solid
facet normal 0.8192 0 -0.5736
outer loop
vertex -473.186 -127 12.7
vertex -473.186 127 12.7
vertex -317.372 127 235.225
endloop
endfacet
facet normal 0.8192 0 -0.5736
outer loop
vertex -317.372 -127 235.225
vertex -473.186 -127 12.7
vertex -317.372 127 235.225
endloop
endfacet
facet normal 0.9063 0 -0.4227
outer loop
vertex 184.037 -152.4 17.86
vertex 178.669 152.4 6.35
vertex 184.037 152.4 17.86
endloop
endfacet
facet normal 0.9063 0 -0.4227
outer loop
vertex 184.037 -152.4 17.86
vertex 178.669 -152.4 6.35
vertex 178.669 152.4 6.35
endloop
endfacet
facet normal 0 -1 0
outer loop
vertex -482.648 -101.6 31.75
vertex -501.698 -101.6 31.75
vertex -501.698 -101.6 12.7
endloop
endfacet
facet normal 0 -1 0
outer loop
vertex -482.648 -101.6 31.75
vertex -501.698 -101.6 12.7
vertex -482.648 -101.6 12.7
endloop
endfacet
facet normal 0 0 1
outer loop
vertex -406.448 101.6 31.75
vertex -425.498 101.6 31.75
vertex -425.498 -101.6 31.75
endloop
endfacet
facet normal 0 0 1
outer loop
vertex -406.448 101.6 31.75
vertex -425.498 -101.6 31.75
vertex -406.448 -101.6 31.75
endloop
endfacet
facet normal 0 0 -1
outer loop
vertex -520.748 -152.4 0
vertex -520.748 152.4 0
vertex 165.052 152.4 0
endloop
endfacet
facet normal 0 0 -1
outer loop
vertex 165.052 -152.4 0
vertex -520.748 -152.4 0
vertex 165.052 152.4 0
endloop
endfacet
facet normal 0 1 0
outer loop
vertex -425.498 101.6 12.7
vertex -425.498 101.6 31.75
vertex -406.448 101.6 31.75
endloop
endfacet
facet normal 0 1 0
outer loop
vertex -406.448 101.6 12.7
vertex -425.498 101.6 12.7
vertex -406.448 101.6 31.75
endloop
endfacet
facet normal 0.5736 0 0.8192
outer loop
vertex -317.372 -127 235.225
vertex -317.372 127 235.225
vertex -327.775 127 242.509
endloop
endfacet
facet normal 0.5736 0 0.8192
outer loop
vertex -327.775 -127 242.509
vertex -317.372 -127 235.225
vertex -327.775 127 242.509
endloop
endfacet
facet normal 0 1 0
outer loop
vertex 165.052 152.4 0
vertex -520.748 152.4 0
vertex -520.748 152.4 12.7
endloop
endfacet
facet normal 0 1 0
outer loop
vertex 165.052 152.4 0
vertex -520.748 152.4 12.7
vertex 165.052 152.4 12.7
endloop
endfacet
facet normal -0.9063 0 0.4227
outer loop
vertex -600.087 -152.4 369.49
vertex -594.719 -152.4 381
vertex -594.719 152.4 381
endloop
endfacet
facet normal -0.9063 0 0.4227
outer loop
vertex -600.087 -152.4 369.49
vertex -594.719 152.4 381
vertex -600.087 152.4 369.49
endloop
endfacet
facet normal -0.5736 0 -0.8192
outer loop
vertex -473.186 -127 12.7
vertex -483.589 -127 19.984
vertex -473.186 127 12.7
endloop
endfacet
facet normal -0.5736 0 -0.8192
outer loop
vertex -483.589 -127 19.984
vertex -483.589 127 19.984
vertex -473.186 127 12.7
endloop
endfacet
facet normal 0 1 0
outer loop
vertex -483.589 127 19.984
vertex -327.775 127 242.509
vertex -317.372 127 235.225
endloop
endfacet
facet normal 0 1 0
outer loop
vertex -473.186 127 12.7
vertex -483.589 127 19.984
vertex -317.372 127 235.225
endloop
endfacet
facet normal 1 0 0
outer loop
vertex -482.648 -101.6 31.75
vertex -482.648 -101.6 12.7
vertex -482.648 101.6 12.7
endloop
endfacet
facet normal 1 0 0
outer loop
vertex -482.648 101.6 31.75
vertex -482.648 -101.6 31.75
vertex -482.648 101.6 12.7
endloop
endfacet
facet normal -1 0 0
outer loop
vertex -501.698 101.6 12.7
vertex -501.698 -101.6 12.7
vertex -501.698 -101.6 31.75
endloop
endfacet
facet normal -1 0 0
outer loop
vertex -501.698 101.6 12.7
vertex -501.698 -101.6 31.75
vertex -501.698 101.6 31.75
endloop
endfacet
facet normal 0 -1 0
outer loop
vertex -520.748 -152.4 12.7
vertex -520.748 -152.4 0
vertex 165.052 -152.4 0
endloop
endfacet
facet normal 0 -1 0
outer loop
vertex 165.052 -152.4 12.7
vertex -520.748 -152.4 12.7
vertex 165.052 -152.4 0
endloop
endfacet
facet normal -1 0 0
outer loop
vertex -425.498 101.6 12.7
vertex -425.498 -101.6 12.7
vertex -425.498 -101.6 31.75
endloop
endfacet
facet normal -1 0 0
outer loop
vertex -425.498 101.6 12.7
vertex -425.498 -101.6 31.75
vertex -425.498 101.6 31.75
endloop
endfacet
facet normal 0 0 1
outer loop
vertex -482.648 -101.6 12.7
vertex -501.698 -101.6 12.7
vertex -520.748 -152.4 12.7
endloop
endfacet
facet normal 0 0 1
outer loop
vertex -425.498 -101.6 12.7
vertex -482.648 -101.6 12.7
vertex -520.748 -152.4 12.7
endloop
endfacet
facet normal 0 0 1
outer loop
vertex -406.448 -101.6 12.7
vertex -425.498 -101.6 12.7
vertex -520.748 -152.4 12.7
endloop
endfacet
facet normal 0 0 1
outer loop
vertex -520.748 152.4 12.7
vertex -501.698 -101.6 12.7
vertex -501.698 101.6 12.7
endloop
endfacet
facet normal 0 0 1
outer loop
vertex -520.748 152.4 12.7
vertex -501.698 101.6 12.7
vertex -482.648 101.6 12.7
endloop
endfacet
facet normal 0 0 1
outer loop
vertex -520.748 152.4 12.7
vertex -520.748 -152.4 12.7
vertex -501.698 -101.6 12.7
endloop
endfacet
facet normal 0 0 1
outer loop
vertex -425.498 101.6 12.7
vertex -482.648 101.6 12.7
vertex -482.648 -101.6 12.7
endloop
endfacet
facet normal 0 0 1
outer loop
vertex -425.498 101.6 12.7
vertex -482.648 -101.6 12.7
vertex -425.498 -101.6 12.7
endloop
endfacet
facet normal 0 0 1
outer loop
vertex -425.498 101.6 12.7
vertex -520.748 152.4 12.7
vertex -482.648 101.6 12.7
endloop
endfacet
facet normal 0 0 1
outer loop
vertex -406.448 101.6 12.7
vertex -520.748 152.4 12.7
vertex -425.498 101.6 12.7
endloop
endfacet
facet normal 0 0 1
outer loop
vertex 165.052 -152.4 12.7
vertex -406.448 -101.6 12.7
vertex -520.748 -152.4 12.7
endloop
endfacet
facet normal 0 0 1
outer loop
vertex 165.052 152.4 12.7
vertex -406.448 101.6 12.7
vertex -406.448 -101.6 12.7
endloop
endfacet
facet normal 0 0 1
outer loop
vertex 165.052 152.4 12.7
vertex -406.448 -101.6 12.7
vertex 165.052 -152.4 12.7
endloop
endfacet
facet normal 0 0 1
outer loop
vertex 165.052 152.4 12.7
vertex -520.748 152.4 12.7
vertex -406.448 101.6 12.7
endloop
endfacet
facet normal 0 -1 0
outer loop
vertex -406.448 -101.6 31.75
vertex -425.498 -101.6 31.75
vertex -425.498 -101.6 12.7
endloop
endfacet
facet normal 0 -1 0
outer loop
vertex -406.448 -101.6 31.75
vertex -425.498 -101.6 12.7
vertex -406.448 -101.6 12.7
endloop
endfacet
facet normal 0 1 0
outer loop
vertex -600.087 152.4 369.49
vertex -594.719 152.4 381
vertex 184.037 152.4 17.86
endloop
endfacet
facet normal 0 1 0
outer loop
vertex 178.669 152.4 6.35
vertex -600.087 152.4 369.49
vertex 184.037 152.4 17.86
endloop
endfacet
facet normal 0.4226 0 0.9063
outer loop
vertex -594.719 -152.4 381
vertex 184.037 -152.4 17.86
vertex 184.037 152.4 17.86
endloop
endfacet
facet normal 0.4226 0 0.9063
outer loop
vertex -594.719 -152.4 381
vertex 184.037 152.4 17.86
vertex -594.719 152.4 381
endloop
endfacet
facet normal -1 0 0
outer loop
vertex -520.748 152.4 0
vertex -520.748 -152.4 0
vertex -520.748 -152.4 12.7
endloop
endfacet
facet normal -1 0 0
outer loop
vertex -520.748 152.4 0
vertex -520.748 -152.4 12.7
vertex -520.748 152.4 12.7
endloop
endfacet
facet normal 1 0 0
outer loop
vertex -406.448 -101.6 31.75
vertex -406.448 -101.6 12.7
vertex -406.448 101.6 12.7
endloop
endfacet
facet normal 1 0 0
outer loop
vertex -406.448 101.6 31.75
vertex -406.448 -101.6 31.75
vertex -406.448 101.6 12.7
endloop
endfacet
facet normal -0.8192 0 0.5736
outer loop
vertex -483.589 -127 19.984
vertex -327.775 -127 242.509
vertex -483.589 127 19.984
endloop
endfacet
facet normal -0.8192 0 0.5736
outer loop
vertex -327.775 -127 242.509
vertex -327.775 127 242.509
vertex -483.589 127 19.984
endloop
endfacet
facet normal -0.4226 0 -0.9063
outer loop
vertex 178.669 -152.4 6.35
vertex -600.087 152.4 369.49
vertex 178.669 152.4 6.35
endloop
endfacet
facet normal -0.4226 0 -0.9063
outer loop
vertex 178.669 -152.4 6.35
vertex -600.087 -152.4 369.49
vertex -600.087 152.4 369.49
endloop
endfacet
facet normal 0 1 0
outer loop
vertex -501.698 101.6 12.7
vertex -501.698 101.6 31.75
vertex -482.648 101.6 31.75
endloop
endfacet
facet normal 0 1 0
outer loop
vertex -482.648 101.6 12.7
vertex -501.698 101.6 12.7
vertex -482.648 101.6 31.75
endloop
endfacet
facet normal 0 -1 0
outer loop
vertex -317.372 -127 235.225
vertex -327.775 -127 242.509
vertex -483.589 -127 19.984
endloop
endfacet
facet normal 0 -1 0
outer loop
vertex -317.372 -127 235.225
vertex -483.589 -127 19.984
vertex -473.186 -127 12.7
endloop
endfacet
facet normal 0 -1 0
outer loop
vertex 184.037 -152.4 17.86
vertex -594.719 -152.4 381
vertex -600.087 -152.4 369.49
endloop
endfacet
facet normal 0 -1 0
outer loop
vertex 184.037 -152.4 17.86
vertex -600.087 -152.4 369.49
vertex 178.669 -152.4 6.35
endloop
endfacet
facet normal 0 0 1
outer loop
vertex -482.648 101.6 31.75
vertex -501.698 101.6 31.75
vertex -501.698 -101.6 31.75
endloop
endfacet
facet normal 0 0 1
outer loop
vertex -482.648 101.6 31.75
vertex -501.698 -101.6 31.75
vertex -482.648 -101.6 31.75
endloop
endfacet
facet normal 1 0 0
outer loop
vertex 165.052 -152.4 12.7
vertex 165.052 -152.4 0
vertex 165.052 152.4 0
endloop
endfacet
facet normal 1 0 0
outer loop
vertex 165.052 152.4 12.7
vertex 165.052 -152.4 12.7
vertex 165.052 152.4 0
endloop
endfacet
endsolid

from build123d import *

# Parameters (mm, degrees)
F0_W          = 685.8
F0_H          = 304.8
F1_DEPTH      = 12.7
F3_DEPTH      = 152.4
F3_DEPTH_BACK = 152.4
F4_W          = 19.05
F4_H          = 203.2
F5_DEPTH      = 19.05
F7_DEPTH      = 127
F7_DEPTH_BACK = 127


with BuildPart() as f1:
    # F0 (on Top) → F1 (new body)
    with BuildSketch(Plane.XY):
        with Locations((-177.8483196557, 0)):
            Rectangle(F0_W, F0_H)
    extrude(amount=F1_DEPTH)

    # F4 (on face) → F5 (join)
    with BuildSketch(Plane.XY.offset(12.7)):
        with Locations((-492.1733196557, 0)):
            Rectangle(F4_W, F4_H)
        with Locations((-415.9733196557, 0)):
            Rectangle(F4_W, F4_H)
    extrude(amount=F5_DEPTH)


with BuildPart() as f3:
    # F2 (on Front) → F3 (new body, two sides)
    with BuildSketch(Plane.XZ) as f3_sk:
        Polygon((178.6692992896, 6.35), (184.0365512137, 17.8601088954), (-594.7194583733, 381), (-600.0867102974, 369.4898911046), align=None)
    extrude(amount=F3_DEPTH)
    extrude(f3_sk.sketch, amount=-F3_DEPTH_BACK)


with BuildPart() as f7:
    # F6 (on Front) → F7 (new body, two sides)
    with BuildSketch(Plane.XZ) as f7_sk:
        Polygon((-317.372261144, 235.224663919), (-327.7754921065, 242.5090846607), (-483.5889392202, 19.9844207417), (-473.1857082577, 12.7), align=None)
    extrude(amount=-F7_DEPTH)
    extrude(f7_sk.sketch, amount=F7_DEPTH_BACK)


solid = Compound([f1.part, f3.part, f7.part])
